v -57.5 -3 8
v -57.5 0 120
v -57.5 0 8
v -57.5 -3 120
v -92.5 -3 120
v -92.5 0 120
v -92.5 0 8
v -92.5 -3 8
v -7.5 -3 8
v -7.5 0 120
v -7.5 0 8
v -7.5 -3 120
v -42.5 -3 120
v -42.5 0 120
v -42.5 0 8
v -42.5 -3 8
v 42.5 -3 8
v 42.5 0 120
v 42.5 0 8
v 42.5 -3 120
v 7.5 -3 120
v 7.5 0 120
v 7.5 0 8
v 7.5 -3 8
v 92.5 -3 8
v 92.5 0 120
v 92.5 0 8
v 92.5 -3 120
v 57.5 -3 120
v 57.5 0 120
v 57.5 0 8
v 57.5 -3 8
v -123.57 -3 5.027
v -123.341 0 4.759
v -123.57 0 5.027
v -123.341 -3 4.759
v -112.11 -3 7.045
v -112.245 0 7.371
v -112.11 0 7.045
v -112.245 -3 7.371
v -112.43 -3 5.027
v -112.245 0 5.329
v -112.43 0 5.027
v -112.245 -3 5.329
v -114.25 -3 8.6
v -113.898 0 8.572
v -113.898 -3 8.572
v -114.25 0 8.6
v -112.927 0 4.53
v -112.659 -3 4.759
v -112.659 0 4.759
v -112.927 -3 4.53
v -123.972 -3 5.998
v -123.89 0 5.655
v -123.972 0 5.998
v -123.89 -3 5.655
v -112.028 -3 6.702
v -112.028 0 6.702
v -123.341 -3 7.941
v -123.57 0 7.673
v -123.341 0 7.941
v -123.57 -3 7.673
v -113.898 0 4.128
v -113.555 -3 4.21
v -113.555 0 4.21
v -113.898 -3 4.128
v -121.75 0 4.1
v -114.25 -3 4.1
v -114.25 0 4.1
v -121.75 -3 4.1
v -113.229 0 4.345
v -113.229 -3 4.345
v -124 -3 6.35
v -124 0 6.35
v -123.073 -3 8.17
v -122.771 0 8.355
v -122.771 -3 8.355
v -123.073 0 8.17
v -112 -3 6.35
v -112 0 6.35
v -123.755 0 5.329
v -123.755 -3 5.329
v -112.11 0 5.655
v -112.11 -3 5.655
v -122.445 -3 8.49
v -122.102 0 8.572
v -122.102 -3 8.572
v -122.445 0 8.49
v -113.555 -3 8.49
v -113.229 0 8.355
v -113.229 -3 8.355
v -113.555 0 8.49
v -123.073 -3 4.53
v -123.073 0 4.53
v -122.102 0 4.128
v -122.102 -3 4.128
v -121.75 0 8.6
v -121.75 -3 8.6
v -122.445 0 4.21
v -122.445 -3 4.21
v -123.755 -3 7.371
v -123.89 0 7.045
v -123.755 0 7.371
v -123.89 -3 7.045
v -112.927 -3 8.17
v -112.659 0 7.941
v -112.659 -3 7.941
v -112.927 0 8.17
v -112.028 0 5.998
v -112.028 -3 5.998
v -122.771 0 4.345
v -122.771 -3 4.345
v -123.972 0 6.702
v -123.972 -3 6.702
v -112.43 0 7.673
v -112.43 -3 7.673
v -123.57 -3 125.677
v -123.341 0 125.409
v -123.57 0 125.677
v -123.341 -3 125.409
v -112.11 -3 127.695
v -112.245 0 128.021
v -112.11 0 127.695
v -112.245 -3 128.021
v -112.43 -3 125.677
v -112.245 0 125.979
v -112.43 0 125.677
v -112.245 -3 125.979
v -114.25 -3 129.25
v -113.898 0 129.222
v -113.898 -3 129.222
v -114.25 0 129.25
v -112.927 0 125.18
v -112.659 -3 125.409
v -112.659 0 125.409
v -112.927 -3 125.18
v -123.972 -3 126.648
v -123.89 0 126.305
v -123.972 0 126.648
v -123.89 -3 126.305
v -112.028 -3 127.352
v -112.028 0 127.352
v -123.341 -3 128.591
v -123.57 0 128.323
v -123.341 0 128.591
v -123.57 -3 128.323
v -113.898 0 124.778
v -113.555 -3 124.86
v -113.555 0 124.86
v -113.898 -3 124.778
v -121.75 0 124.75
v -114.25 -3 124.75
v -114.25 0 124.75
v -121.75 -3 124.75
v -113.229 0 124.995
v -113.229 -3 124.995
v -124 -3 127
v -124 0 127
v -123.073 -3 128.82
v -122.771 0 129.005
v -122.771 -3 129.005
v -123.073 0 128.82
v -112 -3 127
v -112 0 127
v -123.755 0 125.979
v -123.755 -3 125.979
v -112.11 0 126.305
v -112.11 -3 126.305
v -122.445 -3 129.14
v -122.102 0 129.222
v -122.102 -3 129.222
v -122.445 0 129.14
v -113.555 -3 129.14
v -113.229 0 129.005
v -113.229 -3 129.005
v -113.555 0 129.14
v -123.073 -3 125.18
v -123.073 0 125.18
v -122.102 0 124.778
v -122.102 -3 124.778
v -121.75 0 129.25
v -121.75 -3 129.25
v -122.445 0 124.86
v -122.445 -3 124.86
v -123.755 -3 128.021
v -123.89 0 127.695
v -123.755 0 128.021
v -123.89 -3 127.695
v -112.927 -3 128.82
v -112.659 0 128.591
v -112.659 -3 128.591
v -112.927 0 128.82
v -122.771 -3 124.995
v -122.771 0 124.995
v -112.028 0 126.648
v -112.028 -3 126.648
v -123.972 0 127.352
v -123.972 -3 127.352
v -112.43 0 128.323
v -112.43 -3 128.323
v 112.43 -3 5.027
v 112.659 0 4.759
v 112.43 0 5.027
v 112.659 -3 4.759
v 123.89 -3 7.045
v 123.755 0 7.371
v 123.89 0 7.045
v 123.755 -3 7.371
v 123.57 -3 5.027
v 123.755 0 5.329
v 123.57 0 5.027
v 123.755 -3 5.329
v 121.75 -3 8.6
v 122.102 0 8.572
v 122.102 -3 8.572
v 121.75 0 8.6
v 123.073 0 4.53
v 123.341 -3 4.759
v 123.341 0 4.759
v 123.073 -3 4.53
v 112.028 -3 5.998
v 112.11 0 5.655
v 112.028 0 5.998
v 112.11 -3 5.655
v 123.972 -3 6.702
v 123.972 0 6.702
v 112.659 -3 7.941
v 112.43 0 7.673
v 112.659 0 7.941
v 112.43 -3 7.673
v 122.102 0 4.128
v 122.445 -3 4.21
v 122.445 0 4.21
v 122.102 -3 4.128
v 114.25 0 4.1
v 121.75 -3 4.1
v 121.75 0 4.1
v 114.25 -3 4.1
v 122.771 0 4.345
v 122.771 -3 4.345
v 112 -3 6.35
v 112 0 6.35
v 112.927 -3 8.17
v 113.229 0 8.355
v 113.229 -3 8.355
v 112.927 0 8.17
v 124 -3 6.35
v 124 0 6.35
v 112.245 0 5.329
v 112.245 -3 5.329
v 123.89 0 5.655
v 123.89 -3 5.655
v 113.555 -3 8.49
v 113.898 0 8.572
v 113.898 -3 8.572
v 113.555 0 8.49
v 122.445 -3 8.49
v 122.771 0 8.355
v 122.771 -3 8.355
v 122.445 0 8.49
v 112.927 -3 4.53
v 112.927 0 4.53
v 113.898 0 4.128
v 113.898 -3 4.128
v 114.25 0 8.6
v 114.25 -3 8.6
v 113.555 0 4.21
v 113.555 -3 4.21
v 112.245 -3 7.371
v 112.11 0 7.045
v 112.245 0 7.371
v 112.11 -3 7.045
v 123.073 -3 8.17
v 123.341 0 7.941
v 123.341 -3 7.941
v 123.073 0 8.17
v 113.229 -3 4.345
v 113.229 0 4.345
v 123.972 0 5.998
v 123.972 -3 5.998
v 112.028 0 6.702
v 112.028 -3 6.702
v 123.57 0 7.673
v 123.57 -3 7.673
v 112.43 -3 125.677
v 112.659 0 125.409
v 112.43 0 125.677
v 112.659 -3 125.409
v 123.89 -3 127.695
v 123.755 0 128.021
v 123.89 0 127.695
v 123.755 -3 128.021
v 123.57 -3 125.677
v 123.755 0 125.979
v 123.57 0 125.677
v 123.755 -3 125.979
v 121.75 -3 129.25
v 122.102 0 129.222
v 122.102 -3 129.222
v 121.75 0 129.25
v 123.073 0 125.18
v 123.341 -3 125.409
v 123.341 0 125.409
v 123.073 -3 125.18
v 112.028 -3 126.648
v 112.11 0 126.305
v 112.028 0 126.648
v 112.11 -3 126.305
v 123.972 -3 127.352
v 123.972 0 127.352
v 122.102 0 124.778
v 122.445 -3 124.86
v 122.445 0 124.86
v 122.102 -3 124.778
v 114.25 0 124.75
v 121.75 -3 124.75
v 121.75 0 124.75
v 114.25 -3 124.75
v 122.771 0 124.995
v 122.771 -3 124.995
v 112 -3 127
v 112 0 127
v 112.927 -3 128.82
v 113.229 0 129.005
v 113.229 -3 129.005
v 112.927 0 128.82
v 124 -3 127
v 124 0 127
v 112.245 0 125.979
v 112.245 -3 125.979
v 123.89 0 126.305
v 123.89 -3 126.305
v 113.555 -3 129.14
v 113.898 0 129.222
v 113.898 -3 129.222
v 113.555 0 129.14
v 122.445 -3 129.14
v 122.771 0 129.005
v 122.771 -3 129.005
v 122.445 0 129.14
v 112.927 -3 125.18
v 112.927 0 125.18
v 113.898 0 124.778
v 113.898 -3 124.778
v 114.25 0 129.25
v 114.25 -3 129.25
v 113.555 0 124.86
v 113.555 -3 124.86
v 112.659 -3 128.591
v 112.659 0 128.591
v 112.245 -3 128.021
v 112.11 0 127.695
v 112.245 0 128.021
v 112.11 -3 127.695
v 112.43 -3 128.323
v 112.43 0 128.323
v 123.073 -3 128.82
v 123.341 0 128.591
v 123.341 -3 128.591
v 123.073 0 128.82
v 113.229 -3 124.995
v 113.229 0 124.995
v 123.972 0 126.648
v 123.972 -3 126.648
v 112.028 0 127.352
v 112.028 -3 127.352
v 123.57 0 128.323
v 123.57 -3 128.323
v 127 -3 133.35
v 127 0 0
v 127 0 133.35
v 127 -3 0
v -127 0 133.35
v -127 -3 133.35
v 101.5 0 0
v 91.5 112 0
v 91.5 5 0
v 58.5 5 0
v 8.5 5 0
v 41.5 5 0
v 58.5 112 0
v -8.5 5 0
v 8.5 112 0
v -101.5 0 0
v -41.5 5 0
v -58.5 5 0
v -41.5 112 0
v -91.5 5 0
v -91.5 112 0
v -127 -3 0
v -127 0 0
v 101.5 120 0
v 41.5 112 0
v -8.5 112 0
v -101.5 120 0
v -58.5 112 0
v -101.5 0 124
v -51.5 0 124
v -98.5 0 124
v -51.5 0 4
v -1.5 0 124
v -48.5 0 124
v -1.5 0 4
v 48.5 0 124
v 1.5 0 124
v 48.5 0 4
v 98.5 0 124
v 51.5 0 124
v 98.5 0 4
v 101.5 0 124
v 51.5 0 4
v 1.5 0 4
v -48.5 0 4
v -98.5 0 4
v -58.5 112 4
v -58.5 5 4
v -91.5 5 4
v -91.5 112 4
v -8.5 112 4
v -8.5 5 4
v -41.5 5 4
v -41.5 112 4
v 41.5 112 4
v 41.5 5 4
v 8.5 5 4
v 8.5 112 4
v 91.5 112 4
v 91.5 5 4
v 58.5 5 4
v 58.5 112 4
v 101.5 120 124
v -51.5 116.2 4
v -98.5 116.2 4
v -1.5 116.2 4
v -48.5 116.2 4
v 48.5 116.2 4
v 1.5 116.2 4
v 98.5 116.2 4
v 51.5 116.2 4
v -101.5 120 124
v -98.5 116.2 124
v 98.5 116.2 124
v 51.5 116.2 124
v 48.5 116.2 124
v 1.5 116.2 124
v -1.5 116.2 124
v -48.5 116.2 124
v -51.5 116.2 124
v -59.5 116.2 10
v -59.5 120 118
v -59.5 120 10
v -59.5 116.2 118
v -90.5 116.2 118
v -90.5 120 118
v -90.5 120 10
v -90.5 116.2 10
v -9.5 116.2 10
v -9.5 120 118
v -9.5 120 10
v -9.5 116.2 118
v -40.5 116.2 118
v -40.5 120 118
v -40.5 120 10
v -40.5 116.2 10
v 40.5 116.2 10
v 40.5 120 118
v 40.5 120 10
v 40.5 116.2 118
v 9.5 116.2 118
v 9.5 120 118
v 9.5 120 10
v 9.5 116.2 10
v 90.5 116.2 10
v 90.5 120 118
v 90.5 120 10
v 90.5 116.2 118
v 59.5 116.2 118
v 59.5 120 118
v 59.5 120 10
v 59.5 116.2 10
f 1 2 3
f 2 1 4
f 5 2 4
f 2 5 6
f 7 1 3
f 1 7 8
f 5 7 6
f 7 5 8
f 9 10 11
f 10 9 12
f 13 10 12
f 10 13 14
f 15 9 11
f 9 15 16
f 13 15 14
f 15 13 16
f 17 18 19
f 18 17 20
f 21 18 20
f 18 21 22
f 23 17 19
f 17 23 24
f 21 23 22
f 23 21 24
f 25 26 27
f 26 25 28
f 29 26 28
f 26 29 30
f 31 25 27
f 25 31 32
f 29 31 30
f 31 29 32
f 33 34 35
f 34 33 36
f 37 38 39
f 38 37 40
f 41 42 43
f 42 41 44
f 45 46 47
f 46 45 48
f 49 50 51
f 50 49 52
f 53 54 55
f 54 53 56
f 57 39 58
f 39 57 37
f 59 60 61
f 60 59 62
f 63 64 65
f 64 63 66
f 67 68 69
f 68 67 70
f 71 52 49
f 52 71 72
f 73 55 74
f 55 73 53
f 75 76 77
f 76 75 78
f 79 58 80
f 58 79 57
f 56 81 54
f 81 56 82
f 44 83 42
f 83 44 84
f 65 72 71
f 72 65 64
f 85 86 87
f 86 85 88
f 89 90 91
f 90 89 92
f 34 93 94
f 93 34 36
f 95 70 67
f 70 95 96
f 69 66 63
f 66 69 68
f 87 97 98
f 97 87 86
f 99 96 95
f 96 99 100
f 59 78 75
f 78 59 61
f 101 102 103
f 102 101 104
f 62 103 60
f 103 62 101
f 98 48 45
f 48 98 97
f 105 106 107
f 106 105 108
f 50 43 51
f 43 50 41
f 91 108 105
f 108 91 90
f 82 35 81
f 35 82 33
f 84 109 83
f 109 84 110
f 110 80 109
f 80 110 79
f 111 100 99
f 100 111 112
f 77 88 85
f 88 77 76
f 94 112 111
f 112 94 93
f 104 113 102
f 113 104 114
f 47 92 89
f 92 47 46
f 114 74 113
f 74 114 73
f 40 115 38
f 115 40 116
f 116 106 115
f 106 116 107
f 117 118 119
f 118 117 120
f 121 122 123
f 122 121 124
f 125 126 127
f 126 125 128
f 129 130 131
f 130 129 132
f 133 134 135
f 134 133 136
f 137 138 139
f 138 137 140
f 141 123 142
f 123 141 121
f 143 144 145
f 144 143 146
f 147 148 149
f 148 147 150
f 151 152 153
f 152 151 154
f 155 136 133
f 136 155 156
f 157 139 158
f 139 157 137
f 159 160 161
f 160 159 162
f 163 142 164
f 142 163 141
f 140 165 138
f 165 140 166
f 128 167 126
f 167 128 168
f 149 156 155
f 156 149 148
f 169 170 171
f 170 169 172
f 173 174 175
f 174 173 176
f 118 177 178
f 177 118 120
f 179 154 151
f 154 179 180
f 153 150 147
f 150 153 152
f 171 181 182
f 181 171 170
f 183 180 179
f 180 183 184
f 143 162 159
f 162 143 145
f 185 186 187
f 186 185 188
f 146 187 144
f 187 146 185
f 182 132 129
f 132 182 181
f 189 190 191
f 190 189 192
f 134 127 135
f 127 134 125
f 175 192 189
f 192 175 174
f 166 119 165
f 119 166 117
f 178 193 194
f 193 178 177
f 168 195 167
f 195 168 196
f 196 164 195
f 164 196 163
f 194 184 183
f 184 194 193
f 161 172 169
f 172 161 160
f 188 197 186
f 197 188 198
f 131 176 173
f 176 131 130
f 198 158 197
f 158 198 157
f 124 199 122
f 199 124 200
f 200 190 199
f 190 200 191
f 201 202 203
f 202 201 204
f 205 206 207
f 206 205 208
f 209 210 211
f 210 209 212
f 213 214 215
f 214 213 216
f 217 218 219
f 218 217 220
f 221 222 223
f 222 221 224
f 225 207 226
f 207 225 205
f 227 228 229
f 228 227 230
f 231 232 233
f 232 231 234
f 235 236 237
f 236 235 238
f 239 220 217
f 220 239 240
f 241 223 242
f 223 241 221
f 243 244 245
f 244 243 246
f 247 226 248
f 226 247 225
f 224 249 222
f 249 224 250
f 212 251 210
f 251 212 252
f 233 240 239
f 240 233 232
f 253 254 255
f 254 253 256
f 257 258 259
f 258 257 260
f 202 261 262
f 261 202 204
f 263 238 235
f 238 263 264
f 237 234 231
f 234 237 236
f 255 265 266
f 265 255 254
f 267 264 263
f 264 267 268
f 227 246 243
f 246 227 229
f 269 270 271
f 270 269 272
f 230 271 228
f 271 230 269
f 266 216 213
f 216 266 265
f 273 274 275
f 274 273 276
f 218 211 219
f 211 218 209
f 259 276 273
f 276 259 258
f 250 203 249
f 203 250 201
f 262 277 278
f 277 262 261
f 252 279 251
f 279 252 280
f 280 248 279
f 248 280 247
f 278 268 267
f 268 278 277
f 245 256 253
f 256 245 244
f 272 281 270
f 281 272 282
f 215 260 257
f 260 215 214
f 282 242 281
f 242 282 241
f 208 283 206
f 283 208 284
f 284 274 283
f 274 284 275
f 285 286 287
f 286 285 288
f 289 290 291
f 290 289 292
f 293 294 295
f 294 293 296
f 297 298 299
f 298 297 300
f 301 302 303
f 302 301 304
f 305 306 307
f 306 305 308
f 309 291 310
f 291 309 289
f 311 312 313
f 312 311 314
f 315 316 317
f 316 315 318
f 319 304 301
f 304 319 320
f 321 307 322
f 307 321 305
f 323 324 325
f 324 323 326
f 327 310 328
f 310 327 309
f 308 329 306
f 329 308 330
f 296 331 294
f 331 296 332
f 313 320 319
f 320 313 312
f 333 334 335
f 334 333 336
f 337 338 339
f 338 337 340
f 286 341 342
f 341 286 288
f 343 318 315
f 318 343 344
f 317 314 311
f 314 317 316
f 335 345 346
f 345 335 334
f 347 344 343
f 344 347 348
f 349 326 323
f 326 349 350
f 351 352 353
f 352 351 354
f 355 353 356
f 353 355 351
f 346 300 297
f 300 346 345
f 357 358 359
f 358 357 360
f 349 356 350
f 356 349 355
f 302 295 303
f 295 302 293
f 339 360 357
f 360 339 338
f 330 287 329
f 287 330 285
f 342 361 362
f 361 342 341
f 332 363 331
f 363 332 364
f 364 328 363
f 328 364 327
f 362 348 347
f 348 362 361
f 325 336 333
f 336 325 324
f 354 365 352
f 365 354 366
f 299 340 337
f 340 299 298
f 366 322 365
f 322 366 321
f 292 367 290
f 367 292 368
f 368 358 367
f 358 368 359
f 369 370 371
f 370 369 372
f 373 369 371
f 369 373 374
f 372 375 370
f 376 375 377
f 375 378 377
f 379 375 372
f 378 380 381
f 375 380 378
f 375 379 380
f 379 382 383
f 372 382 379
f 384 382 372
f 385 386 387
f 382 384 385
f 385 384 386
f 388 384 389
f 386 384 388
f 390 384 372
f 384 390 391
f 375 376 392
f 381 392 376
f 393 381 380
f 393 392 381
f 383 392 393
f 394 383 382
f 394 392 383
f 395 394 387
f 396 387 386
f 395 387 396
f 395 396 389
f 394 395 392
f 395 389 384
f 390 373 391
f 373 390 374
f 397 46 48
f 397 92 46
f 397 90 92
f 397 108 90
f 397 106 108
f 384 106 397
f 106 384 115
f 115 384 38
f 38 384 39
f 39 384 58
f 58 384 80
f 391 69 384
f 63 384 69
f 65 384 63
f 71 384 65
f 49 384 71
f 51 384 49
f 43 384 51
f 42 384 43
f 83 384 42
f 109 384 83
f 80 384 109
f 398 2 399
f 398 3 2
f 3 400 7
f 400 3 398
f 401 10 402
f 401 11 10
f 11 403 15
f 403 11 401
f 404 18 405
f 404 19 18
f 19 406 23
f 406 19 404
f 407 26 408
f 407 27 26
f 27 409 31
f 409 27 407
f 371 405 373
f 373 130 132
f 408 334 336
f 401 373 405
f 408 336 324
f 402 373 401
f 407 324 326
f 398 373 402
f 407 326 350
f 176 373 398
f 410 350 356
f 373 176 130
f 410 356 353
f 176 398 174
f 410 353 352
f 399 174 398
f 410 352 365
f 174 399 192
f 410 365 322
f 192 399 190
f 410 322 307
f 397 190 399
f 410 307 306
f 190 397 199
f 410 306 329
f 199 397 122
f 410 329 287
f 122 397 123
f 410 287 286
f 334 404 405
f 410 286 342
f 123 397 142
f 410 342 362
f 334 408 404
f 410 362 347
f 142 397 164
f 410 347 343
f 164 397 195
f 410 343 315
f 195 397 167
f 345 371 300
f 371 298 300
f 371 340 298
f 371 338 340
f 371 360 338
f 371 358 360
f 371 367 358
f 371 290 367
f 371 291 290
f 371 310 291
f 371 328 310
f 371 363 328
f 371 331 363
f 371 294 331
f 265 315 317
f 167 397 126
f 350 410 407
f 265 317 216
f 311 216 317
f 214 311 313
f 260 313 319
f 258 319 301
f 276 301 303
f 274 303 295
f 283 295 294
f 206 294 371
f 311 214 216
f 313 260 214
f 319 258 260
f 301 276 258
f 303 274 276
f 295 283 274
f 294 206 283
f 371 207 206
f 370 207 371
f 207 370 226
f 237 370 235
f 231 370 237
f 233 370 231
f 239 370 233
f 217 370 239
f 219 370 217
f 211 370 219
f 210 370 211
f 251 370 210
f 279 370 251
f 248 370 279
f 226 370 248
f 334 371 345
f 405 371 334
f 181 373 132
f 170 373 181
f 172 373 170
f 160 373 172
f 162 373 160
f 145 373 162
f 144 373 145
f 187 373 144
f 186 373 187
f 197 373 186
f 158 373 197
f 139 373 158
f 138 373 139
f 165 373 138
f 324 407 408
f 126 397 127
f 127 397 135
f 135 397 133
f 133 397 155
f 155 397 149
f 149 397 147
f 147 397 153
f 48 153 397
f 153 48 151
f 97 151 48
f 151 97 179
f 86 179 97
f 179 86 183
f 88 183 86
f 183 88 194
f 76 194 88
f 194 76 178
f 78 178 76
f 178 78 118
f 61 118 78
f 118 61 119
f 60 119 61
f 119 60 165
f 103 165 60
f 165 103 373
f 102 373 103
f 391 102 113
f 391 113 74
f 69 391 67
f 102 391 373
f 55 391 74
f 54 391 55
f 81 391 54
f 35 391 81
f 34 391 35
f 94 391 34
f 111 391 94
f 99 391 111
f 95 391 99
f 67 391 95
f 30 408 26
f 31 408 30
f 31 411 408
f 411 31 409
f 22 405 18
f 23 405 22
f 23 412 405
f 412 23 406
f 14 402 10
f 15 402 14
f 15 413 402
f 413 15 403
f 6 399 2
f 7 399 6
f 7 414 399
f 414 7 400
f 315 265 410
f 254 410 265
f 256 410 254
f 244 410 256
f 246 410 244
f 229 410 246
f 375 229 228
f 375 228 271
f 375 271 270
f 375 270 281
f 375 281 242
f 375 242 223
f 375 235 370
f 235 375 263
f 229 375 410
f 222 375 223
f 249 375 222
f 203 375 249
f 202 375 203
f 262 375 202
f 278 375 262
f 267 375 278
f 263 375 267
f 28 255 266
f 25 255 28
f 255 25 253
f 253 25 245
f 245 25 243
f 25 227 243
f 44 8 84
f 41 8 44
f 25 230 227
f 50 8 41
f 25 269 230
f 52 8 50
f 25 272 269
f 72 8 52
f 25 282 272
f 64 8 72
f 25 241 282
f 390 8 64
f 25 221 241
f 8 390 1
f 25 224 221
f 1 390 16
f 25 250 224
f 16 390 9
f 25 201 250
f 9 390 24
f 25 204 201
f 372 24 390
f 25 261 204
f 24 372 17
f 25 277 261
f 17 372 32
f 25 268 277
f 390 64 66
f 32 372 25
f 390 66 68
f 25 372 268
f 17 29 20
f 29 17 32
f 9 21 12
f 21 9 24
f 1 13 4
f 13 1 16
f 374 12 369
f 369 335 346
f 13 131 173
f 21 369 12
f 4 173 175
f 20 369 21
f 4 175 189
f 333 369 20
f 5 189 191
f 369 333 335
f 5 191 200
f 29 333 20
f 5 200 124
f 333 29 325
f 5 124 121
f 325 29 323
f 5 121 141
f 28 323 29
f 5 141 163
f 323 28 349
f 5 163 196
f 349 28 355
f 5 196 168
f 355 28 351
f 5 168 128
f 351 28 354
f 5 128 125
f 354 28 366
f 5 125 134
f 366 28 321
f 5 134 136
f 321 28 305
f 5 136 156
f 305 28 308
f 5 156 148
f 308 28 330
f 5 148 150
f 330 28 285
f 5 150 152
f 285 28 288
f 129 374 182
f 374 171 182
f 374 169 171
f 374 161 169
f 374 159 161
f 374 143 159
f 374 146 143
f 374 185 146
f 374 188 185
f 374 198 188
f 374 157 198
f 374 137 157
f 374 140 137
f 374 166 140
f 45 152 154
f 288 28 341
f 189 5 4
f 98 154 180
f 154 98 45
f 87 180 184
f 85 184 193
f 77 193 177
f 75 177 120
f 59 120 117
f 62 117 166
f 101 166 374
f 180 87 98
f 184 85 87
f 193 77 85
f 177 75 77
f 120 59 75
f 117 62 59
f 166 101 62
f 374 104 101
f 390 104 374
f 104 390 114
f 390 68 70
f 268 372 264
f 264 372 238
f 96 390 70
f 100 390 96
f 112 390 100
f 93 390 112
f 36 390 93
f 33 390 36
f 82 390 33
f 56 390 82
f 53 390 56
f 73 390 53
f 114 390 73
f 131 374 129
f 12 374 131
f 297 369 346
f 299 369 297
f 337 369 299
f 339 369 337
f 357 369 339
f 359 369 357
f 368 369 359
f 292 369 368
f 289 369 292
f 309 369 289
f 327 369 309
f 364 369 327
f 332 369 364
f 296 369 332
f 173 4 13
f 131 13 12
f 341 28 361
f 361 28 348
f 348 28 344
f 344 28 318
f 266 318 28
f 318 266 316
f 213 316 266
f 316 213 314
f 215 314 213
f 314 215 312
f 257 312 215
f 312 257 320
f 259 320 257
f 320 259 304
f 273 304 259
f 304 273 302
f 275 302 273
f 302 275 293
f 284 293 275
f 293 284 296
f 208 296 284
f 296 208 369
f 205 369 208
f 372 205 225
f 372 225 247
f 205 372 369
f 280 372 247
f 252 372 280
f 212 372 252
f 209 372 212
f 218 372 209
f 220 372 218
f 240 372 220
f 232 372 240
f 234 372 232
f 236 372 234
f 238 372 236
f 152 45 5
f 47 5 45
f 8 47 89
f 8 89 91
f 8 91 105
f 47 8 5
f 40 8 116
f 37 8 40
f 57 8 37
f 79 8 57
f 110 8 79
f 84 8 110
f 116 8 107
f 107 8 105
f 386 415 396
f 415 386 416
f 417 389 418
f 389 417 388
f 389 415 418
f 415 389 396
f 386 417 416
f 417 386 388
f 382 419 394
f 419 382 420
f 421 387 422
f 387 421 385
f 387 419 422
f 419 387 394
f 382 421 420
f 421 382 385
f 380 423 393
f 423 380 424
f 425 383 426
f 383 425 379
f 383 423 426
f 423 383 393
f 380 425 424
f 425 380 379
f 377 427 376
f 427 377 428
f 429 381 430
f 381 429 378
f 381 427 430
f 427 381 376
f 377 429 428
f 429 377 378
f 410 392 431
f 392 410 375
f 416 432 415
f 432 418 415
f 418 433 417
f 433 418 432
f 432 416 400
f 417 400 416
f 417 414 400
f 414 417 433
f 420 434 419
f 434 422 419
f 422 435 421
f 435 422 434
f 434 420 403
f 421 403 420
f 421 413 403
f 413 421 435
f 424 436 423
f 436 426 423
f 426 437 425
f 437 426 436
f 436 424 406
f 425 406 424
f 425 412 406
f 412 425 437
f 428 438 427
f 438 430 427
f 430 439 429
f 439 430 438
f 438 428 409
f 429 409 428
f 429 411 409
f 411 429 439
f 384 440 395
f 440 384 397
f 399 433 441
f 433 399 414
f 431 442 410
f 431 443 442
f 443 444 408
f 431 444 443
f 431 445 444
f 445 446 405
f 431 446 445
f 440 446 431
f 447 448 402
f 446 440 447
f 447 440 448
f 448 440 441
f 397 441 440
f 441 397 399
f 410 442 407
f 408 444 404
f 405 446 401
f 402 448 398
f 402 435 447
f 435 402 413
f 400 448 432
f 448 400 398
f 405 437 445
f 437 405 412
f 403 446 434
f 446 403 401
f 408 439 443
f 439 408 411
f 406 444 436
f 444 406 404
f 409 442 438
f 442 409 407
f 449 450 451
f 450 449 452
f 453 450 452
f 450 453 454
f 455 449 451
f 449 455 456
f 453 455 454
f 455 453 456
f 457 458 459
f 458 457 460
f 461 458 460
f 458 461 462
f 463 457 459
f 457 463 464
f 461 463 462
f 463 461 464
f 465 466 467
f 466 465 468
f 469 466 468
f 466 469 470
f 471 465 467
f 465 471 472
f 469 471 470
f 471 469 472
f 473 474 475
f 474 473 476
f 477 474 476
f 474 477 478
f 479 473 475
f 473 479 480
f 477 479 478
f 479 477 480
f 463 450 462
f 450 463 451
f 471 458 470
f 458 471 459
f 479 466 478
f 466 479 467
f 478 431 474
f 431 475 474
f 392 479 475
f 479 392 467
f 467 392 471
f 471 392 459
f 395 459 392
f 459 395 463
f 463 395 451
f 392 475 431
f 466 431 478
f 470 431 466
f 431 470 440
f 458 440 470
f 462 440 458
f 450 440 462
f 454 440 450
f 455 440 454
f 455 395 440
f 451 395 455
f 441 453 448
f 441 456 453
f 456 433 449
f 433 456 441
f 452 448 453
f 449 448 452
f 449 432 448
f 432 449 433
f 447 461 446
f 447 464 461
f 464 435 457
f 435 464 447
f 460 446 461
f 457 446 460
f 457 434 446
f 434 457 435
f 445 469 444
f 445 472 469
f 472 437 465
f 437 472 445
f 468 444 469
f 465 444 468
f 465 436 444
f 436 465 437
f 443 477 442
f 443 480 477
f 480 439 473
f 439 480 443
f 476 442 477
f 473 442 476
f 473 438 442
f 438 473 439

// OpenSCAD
// =============================================================================
//  Modular 10" rack mount generator  (DeskPi RackMate / 10-inch racks)
//
//  One reusable engine builds a rack faceplate + a row of vented cradle bays.
//  A "device" is defined only by its outer size; add a new item by adding a
//  row to the device table below -> the bays resize to fit it.
//
//  Mounting convention (all devices): the unit stands on its THIN edge, front
//  face to the rack front (shown through a faceplate window), big faces to the
//  dividers, so vents end up TOP/BOTTOM -> vertical convection (open floor +
//  open top). Devices taller/deeper than the cradle simply overhang (like a
//  cable modem in a partial cradle).
//
//    device="minipc"  -> 4 bays, fully cradled (120mm tall) on a 3U panel
//    device="cm3500"  -> 1 vented channel for an ARRIS CM3500 (230x57x195),
//                        cradled in the lower 3U; the modem pokes up & out back
//
//  Examples:
//    openscad -D device=\"minipc\"               -o minipc.stl   rack_mount.scad
//    openscad -D device=\"minipc\" -D split=true -D half=\"L\" -o L.stl rack_mount.scad
//    openscad -D device=\"cm3500\" -D panel_w=250 -D slot_len=8 -o cm3500_A1.stl rack_mount.scad
//    openscad -D device=\"minipc\" -D show_pc=true ...   (ghost preview)
// =============================================================================

device = "minipc";   // "minipc" | "cm3500"  (add more in the table below)

// ---- Device table : [ name, across(thick), high, deep, bays, wall_vent, back ]
//   across   = thickness, packed across the rack
//   high     = device height (stands vertically); may exceed the panel
//   deep     = device depth into the rack; may exceed the cradle (overhang ok)
//   bays     = how many across
//   wall_vent= louvre the side walls? (big side faces need airflow)
//   back     = "ported" (back wall w/ port windows) | "open" (overhanging dev)
DEVICES = [
    [ "minipc", 43, 120, 115, 4, false, "ported" ],
    [ "cm3500", 57, 230, 195, 1, true,  "open"   ],
];

// ---- Print splitting (even bay counts only) --------------------------------
split  = false;      // true -> cut into left/right halves for a small bed
half   = "both";     // "L", "R" (export one) or "both" (preview)
seam_d = 3.2;        // alignment-dowel holes at the center seam

// ---- 10" rack interface ----  *** VERIFY THESE AGAINST YOUR RACK ***  -------
u_mm     = 44.45;   // 1U
units    = 3;       // faceplate height in U
panel_w  = 254;     // 10-inch faceplate width (use 250 to print on a 256 bed)
hole_dx  = 236;     // center-to-center between the LEFT and RIGHT rail holes
edge_z   = 6.35;    // rail hole inset from top/bottom (EIA 0.25")
screw_d  = 4.5;     // M4 clearance hole (use 6.5 for M6 racks)
slot_len = 12;      // horizontal mount-slot length (use 8 for a 250mm panel)

// ---- Structure --------------------------------------------------------------
clr         = 2.0;   // clearance around the device in its bay
max_depth   = 125;   // cap cradle depth so it fits a 10" rack (devices overhang)
face_t      = 3.0;   // front faceplate thickness
base        = 4.0;   // floor thickness
div_t       = 3.0;   // divider / wall thickness
wall        = 3.0;   // back wall thickness
ledge       = 5.0;   // floor ledge the device rests on (rest open for venting)
front_lip   = 4.0;   // faceplate overlap onto the front bezel (retains device)
back_margin = 6.0;   // back-wall overlap onto rear edges (ported mode)
back_gap    = 2.0;   // depth clearance behind the device
ov          = 0.8;   // interference overlap so everything fuses into one solid

show_pc = false;     // true = draw a ghost device for previews (NOT in STL)
$fn = 40;

// ---- Resolve the selected device -------------------------------------------
row     = DEVICES[search([device], DEVICES)[0]];
dev_t   = row[1];
dev_h   = row[2];
dev_d   = row[3];
n_bays  = row[4];
w_vent  = row[5];
back    = row[6];

// ---- Derived ----------------------------------------------------------------
panel_h  = units * u_mm;
bay_w    = dev_t + 2*clr;
pitch    = bay_w + div_t;
total_w  = n_bays*bay_w + (n_bays + 1)*div_t;
cradle_d = min(dev_d + back_gap, max_depth);
wall_top = min(base + dev_h, panel_h);        // walls capped at the panel top
win_z0   = base + front_lip;
win_z1   = wall_top - front_lip;
win_zc   = (win_z0 + win_z1)/2;
win_h    = win_z1 - win_z0;
win_w    = dev_t - 2*front_lip;
mid_i    = floor(n_bays/2);
can_split = split && (n_bays % 2 == 0);

function bay_cx(i) = -total_w/2 + div_t + bay_w/2 + i*pitch;
function div_cx(i) = -total_w/2 + i*pitch + div_t/2;

// =============================================================================
//  Helpers
// =============================================================================
module xslot(len, d, depth) {                 // horizontal slot bored along +Y
    hull() for (s = [-1, 1])
        translate([s*(len - d)/2, 0, 0])
            rotate([-90, 0, 0]) cylinder(d = d, h = depth);
}

// =============================================================================
//  Parts
// =============================================================================
module faceplate() {
    difference() {
        translate([-panel_w/2, -face_t, 0]) cube([panel_w, face_t, panel_h]);
        for (i = [0:n_bays-1])                                   // front windows
            translate([bay_cx(i) - win_w/2, -face_t - 1, win_zc - win_h/2])
                cube([win_w, face_t + 2, win_h]);
        for (sx = [-1, 1], sz = [edge_z, panel_h - edge_z])      // mount slots
            translate([sx*hole_dx/2, -face_t - 1, sz])
                xslot(slot_len, screw_d, face_t + 2);
    }
}

module backwall() {                                              // ported mode
    bw_w = dev_t - 2*back_margin;
    bw_h = win_h + 2*front_lip - 2*back_margin;
    difference() {
        translate([-total_w/2, cradle_d - ov, 0])
            cube([total_w, wall + ov, wall_top]);
        for (i = [0:n_bays-1])
            translate([bay_cx(i) - bw_w/2, cradle_d - ov - 1, win_zc - bw_h/2])
                cube([bw_w, wall + 2, bw_h]);
    }
}

module floor_and_walls() {
    // Ventilated floor: a ledge frame per bay, open in the middle
    difference() {
        translate([-total_w/2, -ov, 0]) cube([total_w, cradle_d + ov, base]);
        for (i = [0:n_bays-1])
            translate([bay_cx(i) - (dev_t/2 - ledge), ledge, -1])
                cube([dev_t - 2*ledge, cradle_d - 2*ledge, base + 2]);
    }

    // n+1 dividers / side walls. Center divider doubled when splitting; the
    // big side faces get louvre slots when the device needs side airflow.
    for (i = [0:n_bays]) {
        cw = (can_split && i == mid_i) ? 2*div_t : div_t;
        difference() {
            translate([div_cx(i) - cw/2, -ov, 0])
                cube([cw, cradle_d + ov, wall_top]);
            if (w_vent)
                for (yy = [cradle_d*0.16 : (cradle_d*0.68)/4 : cradle_d*0.84])
                    translate([div_cx(i) - cw, yy, base + 8])
                        cube([cw + 2, cradle_d*0.10, wall_top - base - 16]);
        }
    }
}

// Alignment-dowel holes through the center seam (split only)
module seam_holes() {
    for (z = [win_zc - 35, win_zc + 35])
        translate([0, cradle_d*0.5, z]) rotate([0, 90, 0])
            cylinder(d = seam_d, h = 4*div_t + 2, center = true);
}

module solid_assembly() {
    if (can_split)
        difference() {
            union() { faceplate(); floor_and_walls(); if (back=="ported") backwall(); }
            seam_holes();
        }
    else { faceplate(); floor_and_walls(); if (back=="ported") backwall(); }
}

module half_cut(which) {
    big = 1000;
    intersection() {
        solid_assembly();
        if (which == "L") translate([-big, -big, -big/2]) cube([big, 2*big, big]);
        else              translate([0,    -big, -big/2]) cube([big, 2*big, big]);
    }
}

module ghost_devices() {
    color([0.25, 0.4, 0.55, 0.45])
        for (i = [0:n_bays-1])
            translate([bay_cx(i) - dev_t/2, 0, base])
                cube([dev_t, dev_d, dev_h]);
}

// =============================================================================
//  Output
// =============================================================================
if (!can_split) {
    color([0.85, 0.85, 0.88]) solid_assembly();
    if (show_pc) ghost_devices();
} else if (half == "both") {
    color([0.85, 0.85, 0.88]) {
        translate([-6, 0, 0]) half_cut("L");
        translate([ 6, 0, 0]) half_cut("R");
    }
} else {
    color([0.85, 0.85, 0.88]) half_cut(half);
}
